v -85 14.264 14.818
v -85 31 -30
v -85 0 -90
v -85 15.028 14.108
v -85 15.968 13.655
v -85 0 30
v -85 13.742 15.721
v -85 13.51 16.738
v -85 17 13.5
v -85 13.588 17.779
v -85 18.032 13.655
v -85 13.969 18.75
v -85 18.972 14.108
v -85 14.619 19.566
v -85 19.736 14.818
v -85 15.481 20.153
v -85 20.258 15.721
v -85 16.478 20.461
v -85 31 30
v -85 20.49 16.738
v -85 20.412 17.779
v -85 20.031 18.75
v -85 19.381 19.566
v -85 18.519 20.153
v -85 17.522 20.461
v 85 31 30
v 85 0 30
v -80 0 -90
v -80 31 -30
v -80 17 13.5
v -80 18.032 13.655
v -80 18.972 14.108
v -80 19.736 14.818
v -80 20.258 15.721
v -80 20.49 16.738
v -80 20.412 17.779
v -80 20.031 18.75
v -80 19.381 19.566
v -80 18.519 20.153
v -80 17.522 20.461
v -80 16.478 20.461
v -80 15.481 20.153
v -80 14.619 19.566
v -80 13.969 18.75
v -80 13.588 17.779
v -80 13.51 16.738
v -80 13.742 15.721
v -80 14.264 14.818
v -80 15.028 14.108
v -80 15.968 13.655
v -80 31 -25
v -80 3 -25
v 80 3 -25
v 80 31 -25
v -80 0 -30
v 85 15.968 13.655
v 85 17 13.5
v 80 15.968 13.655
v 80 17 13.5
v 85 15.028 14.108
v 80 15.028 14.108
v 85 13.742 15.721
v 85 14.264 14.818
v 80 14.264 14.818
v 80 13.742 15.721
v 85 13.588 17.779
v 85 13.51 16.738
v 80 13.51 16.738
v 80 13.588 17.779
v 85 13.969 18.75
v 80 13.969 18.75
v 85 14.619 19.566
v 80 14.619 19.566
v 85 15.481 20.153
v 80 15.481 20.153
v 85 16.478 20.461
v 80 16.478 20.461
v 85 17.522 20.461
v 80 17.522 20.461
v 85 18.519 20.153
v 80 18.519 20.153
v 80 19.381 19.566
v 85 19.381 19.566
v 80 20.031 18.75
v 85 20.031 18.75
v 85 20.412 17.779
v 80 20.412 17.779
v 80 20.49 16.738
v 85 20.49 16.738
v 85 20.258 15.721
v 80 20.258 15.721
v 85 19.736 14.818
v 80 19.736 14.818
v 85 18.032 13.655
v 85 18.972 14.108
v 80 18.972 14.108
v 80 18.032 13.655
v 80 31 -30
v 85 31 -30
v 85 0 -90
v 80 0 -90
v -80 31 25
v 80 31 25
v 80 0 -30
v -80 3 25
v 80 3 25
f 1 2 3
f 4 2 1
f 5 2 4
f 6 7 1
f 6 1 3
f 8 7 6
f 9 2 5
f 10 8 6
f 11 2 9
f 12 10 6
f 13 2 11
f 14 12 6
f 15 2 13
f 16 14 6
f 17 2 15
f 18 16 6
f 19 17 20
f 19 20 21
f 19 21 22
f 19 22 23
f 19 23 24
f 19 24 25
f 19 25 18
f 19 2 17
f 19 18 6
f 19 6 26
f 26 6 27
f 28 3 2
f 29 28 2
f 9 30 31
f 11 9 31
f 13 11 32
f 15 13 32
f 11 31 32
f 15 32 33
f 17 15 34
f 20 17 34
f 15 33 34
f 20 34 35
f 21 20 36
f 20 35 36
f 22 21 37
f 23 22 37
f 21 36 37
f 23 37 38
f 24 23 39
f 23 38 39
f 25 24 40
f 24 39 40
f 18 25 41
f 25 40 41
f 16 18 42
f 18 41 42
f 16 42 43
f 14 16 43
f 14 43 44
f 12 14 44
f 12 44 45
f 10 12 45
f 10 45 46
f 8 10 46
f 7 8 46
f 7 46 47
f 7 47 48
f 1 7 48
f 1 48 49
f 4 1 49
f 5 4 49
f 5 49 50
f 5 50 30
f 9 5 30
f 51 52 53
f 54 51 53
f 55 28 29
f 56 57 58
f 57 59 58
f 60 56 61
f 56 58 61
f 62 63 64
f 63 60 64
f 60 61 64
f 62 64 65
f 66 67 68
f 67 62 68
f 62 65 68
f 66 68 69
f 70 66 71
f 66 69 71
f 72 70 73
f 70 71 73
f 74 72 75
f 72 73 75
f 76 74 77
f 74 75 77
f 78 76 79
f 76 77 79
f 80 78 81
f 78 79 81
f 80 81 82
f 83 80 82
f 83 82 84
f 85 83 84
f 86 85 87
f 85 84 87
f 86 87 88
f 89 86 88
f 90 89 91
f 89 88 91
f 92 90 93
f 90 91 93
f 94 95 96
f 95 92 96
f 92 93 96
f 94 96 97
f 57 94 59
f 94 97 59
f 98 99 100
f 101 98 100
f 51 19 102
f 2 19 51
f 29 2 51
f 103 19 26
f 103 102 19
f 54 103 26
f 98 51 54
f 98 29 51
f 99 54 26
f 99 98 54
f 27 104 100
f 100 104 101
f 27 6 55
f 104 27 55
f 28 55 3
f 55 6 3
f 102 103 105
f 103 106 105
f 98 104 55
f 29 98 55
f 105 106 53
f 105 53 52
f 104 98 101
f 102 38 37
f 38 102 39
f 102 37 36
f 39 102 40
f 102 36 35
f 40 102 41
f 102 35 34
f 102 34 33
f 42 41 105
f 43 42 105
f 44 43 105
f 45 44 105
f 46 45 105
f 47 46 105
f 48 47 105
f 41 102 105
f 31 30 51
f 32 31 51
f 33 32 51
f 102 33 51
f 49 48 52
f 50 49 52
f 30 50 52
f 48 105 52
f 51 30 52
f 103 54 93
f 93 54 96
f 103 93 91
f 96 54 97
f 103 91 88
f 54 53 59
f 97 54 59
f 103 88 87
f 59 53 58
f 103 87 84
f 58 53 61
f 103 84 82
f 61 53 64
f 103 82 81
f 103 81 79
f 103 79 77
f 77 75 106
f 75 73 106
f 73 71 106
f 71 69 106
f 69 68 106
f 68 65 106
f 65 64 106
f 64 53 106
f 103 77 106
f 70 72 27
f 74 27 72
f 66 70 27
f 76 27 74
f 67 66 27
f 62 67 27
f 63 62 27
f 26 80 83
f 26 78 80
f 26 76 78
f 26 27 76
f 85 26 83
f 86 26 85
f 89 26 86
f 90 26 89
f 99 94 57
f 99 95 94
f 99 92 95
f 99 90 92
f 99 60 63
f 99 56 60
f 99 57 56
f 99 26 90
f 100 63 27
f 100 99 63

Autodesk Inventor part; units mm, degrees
ref_plane "YZ Plane" through (0, 0, 0) normal (1, 0, 0) x (0, 1, 0)
ref_plane "XZ Plane" through (0, 0, 0) normal (0, 1, 0) x (-1, 0, 0)
ref_plane "XY Plane" through (0, 0, 0) normal (0, 0, 1) x (1, 0, 0)
sketch "Sketch1" plane through (0, 0, 0) normal (0, 1, 0) x (-1, 0, 0)
  line L0 (85, 30) -> (-85, 30)
  line L1 (-85, 30) -> (-85, -30)
  line L2 (-85, -30) -> (85, -30)
  line L3 (85, -30) -> (85, 30)
  line L4 (85, 30) -> (-85, -30) construction
  line L5 (-85, 30) -> (85, -30) construction
  line L6 (0, -42) -> (0, 42) projected
  point P0 (0, 0)
  point P1 (-100, -30)
  point P2 (-85, -27)
  dimension "d0" = 170
  dimension "d1" = 60
  dimension "d32" = 15
extrude "Extrusion1" add sketch "Sketch1" along normal blind 3
sketch "Sketch2" plane through (0, 3, 0) normal (0, 1, 0) x (1, 0, 0)
  line L0 (-85, 30) -> (-85, -30) projected
  line L1 (-85, -30) -> (85, -30) projected
  line L2 (85, -30) -> (85, 30) projected
  line L3 (80, -25) -> (-80, -25)
  line L4 (-80, -25) -> (-80, 25)
  line L5 (-80, 25) -> (80, 25)
  line L6 (80, 25) -> (80, -25)
  line L7 (80, -25) -> (-80, 25) construction
  line L8 (-80, -25) -> (80, 25) construction
  line L9 (85, 30) -> (-85, 30) projected
  point P0 (0, 0)
  dimension "d36" = 160
  dimension "d37" = 50
extrude "Extrusion2" add sketch "Sketch2" along normal blind 28
sketch "Sketch9" plane through (-80, 20, 19) normal (1, 0, 0) x (0, 0, -1)
  circle A0 centre (2, -3) radius 3.5
  line L0 (49, -20) -> (-11, -20) projected
  line L1 (-11, -20) -> (-11, 11) projected
  point P0 (19, -20)
  point P1 (44, -20)
  dimension "d27" = 7
  dimension "d28" = 17
  dimension "d41" = 13
extrude "Extrusion7" cut sketch "Sketch9" against normal up to surface (5 mm away)
mirror "Mirror2" about plane through (0, 0, 0) normal (1, 0, 0) of "Extrusion7"
sketch "Sketch14" plane through (0, 3, 0) normal (0, 1, 0) x (1, 0, 0)
  point P0 (0, 0)
sketch "Sketch15" plane through (85, 0, 30) normal (1, 0, 0) x (0, 0, -1)
  line L0 (60, 31) -> (0, 31) projected
  line L1 (60, 31) -> (120, 0)
  line L2 (120, 0) -> (60, 0)
  circle A0 centre (13, 17) radius 3.5 projected
  line L3 (0, 0) -> (60, 0) projected
  line L4 (60, 0) -> (60, 31) projected
  line L5 (0, 31) -> (60, 31) projected
  line L6 (0, 0) -> (0, 31) projected
  point P0 (30, 0)
  dimension "d67" = 60
extrude "Extrusion12" add sketch "Sketch15" against normal blind 5 contours L1 L2 L4
mirror "Mirror5" about plane through (0, 0, 0) normal (1, 0, 0) of "Extrusion12"
equation "\"d0\" = Width"
equation "\"d1\" = Length"
equation "\"d32\" = -0.5 * Width + 0.5 * FullWidth"
equation "\"d2\" = BaseWallThickness"
equation "\"d36\" = Width - 2 * SideWallThickness"
equation "\"d37\" = Length - 2 * SideWallThickness"
equation "\"d5\" = Height - 2 * BaseWallThickness"
equation "\"d28\" = DriveMotorHeight"
equation "\"d67\" = WedgeLength"
equation "\"d68\" = SideWallThickness"
equation "\"SideWallThickness\" = 5"
equation "\"BaseWallThickness\" = 3"
equation "\"Width\" = 170"
equation "\"Length\" = 60"
equation "\"Height\" = 34"
equation "\"DriveMotorHeight\" = 17"
equation "\"DriveMotorMountThickness\" = 2"
equation "\"WedgeLength\" = 60"
equation "\"FullWidth\" = 200"
properties part number "BodyWedgeV1-NoMotor" material "Thermoplastic Resin"
